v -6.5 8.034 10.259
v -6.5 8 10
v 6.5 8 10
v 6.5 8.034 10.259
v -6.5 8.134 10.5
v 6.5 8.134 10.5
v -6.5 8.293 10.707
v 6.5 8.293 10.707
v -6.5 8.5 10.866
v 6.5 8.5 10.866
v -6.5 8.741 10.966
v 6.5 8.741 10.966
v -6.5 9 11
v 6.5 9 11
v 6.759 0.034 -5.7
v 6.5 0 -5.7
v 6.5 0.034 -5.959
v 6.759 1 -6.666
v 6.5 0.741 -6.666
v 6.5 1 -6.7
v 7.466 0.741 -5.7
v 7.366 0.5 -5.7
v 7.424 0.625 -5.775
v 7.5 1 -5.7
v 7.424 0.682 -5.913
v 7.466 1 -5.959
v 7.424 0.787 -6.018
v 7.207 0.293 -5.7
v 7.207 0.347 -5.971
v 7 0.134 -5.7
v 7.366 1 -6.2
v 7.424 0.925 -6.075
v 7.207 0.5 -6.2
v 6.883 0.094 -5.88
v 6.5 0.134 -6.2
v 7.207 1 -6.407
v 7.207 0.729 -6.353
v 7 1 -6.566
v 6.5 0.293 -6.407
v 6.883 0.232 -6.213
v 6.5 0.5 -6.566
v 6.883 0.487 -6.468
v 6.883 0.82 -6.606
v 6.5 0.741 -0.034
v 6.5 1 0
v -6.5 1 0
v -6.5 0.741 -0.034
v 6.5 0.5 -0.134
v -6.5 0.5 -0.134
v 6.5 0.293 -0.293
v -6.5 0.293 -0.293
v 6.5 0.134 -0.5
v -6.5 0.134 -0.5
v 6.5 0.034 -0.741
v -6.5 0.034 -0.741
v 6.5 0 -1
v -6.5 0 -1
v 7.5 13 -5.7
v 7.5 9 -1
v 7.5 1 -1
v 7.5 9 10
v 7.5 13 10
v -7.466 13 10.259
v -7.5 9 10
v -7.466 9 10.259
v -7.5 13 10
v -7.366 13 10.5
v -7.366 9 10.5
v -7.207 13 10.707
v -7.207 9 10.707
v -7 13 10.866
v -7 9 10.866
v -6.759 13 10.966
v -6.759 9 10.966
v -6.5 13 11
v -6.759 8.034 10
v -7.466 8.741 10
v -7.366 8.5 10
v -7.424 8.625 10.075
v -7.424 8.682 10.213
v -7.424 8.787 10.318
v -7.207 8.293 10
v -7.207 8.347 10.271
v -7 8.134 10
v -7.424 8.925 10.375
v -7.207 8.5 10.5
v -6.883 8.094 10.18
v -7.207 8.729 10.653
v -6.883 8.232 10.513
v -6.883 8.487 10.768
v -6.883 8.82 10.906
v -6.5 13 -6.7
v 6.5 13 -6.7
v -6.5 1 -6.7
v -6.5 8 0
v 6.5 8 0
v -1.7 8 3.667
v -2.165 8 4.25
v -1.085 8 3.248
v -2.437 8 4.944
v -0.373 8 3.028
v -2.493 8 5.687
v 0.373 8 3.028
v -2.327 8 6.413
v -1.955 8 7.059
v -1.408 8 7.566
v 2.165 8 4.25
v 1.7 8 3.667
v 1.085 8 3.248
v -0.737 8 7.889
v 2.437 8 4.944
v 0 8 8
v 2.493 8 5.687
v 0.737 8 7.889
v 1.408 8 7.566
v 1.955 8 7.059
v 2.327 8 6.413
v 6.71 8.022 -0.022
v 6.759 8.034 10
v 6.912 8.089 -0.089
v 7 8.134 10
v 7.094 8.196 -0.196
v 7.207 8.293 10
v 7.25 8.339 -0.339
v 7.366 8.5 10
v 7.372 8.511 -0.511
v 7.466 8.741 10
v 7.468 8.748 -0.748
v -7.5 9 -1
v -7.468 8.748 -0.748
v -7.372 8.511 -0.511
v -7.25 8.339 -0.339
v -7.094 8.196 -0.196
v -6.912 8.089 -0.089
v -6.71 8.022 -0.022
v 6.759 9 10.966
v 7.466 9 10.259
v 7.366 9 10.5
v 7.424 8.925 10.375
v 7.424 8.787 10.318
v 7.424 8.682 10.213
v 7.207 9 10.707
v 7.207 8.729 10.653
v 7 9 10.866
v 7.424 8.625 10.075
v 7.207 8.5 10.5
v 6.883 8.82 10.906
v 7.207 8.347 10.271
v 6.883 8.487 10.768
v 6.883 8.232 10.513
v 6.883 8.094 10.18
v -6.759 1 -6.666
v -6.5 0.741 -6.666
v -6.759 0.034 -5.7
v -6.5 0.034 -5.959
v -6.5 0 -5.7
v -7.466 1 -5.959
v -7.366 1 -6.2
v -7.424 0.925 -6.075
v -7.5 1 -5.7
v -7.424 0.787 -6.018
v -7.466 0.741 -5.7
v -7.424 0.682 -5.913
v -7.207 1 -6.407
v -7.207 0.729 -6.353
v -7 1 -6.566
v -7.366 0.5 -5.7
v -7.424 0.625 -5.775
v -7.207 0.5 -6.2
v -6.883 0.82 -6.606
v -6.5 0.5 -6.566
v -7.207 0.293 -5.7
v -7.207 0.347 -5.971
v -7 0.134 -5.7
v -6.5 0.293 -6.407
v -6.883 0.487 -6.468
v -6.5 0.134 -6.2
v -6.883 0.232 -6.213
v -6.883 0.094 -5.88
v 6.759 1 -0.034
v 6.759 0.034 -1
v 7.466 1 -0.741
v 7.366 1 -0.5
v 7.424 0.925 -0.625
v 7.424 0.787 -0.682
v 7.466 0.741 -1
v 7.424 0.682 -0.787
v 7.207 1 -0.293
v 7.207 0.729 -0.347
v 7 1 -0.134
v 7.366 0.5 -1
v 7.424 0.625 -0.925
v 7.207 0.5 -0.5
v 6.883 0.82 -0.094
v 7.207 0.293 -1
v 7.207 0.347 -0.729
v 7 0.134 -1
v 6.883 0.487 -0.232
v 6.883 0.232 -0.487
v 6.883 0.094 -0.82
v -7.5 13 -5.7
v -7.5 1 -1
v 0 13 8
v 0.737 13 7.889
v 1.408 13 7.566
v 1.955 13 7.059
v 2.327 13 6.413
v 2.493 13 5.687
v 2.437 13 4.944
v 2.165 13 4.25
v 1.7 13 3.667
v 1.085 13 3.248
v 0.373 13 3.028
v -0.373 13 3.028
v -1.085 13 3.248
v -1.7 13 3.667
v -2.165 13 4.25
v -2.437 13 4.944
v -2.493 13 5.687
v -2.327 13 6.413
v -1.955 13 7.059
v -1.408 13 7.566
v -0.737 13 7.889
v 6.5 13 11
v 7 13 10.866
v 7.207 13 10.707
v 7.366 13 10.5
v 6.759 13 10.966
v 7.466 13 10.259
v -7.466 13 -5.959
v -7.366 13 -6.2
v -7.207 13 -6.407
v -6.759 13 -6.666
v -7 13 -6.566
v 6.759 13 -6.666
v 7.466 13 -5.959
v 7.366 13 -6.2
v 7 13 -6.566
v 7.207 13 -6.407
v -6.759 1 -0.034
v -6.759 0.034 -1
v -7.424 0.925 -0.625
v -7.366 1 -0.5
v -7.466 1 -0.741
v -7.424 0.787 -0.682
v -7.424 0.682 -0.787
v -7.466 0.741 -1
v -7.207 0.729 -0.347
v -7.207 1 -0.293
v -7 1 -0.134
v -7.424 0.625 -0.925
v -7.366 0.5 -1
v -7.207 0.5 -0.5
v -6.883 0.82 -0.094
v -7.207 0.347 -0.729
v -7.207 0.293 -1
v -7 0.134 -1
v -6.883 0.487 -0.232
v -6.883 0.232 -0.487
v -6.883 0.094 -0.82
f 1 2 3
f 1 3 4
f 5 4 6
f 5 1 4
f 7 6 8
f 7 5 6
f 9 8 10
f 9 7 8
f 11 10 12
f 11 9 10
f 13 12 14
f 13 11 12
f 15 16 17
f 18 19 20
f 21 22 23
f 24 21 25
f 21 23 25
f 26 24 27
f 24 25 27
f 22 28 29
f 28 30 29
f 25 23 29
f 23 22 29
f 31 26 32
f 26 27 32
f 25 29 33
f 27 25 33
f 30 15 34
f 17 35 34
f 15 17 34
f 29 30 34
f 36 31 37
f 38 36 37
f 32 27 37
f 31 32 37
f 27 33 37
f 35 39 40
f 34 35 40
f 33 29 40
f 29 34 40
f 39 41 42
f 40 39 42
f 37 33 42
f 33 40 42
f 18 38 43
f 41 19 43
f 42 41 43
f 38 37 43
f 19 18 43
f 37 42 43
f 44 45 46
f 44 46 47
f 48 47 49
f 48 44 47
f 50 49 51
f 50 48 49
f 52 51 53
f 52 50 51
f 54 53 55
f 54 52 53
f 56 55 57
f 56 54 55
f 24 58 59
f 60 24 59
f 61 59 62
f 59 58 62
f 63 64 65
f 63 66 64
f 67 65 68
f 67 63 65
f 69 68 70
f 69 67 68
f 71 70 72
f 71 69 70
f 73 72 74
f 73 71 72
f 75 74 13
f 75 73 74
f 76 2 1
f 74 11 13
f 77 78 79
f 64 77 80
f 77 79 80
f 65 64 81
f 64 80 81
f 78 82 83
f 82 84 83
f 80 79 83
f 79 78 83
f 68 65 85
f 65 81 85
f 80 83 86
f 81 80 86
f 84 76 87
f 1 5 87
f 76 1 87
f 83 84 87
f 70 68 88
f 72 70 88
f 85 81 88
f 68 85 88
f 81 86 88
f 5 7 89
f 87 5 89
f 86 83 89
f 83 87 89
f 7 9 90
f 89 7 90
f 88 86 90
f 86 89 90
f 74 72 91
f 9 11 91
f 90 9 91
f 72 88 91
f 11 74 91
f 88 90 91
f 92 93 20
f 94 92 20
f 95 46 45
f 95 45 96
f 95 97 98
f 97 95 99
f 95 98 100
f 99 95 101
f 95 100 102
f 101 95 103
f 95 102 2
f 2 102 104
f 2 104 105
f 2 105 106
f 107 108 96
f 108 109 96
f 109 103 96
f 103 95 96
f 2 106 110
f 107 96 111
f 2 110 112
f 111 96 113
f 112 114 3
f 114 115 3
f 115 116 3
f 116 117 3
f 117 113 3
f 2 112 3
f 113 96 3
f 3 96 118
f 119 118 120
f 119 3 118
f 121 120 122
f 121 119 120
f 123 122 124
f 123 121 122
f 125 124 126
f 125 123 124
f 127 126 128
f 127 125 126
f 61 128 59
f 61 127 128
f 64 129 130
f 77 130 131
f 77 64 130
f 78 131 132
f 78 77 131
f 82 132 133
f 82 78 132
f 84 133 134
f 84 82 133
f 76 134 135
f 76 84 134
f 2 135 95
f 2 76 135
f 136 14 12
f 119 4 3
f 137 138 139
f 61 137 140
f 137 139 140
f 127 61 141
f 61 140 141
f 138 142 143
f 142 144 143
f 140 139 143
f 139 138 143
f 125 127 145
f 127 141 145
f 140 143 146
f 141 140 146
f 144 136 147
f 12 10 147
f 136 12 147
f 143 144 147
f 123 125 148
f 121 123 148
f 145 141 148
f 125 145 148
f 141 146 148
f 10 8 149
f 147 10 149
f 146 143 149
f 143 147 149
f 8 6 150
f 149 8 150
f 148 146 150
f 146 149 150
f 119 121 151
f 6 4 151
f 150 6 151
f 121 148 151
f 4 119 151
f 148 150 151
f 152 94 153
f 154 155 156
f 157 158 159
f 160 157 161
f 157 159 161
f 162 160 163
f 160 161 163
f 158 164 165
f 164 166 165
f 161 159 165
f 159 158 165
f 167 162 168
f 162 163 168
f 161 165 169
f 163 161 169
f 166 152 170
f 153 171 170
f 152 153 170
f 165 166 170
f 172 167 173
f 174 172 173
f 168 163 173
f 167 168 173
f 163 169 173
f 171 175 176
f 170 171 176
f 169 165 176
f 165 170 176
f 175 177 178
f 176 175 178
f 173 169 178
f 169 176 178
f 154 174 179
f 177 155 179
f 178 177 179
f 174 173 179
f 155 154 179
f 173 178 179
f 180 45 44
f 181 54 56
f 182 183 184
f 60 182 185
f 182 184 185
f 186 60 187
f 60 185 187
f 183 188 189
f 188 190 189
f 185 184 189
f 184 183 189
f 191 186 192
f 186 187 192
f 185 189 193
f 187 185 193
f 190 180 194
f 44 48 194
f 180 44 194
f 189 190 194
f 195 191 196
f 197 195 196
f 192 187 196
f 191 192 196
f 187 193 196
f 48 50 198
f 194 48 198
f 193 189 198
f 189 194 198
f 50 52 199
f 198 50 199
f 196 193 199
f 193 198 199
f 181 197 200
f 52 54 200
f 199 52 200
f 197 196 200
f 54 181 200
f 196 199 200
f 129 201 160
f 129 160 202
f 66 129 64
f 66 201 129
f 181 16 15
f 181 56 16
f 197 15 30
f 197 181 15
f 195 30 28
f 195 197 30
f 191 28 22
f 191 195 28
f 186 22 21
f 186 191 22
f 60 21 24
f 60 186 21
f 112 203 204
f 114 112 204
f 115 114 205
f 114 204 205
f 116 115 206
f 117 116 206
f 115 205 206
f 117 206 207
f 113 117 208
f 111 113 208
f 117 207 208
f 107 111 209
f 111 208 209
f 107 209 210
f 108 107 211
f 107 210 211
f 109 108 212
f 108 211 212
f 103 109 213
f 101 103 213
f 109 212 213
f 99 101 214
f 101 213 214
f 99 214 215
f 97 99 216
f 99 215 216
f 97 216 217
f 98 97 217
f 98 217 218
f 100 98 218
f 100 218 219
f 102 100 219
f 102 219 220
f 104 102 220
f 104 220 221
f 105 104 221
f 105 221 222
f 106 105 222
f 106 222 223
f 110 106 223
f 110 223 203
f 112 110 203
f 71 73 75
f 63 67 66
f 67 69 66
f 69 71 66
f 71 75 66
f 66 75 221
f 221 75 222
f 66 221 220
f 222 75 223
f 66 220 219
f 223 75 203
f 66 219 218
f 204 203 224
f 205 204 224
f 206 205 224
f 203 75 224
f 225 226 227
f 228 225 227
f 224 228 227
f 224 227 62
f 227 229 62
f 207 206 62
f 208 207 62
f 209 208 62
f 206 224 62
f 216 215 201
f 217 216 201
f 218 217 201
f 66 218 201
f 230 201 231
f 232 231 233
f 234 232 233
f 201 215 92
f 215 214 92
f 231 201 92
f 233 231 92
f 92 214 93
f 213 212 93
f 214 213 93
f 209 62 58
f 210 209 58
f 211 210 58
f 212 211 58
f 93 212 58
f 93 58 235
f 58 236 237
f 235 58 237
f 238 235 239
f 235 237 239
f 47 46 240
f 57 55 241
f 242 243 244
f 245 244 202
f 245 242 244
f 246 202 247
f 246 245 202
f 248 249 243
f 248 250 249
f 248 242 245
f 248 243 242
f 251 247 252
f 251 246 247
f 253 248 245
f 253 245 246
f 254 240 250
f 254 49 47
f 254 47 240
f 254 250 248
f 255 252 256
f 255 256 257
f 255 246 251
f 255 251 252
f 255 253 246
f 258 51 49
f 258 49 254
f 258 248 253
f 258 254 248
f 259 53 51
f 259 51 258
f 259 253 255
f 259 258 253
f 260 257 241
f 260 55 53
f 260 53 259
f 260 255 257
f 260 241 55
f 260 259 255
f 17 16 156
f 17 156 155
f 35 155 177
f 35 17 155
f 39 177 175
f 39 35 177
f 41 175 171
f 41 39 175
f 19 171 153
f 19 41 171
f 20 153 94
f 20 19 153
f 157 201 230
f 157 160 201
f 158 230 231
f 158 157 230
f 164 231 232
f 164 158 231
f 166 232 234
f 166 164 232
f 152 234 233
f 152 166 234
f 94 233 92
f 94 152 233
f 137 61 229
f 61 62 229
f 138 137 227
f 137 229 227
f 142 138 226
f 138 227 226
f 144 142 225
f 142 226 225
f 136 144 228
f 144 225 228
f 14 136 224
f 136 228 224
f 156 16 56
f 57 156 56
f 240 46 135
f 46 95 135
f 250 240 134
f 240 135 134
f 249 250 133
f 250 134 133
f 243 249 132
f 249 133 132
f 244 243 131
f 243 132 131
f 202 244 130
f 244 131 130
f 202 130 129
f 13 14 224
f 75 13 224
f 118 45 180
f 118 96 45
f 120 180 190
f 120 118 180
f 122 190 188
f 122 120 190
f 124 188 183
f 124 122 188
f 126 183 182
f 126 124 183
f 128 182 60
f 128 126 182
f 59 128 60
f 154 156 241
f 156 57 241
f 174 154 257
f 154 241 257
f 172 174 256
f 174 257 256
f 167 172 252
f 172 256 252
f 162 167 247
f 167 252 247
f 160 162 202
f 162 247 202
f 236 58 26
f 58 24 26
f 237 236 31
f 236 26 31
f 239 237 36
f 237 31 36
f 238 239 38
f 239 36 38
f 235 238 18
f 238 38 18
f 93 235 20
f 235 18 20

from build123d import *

# Parameters (mm, degrees)
BOSS_EXTRUDE1_DEPTH = 7.5
CUT_EXTRUDE1_REACH  = 20.608
SKETCH2_R           = 2.5
FILLET1_R           = 1


with BuildPart() as part:
    # Sketch1 → Boss-Extrude1 (new, symmetric)
    with BuildSketch(Plane(origin=(0, 0, 0), x_dir=(0, 0, -1), z_dir=(1, 0, 0))):
        Polygon((0, 0), (0, 8), (-11, 8), (-11, 13), (6.7, 13), (6.7, 0), align=None)
    extrude(amount=BOSS_EXTRUDE1_DEPTH, both=True)

    # Sketch2 → Cut-Extrude1 (cut, up to next)
    with BuildSketch(Plane(origin=(0, 13, 0), x_dir=(1, 0, 0), z_dir=(0, 1, 0)), mode=Mode.PRIVATE) as cut_extrude1_sk1:
        with Locations(Location((0, -5.5, 0), (0, 0, 270))):
            Circle(SKETCH2_R)
    cut_extrude1_tool1 = extrude(cut_extrude1_sk1.sketch, amount=-CUT_EXTRUDE1_REACH, mode=Mode.PRIVATE) & part.part
    add(cut_extrude1_tool1.solids().sort_by_distance((0, 13, 5.5))[0], mode=Mode.SUBTRACT)

    # Fillet1
    fillet1_edges = [part.edges().sort_by_distance(p)[0] for p in [
        (0, 0, 0),
        (0, 8, 11),
        (0, 0, -6.7),
        (7.5, 10.5, 11),
        (7.5, 8, 5.5),
        (7.5, 4, 0),
        (7.5, 0, -3.35),
        (-7.5, 4, 0),
        (-7.5, 8, 5.5),
        (-7.5, 10.5, 11),
        (-7.5, 6.5, -6.7),
        (-7.5, 0, -3.35),
        (7.5, 6.5, -6.7),
    ]]
    fillet(fillet1_edges, radius=FILLET1_R)


solid = part.part
